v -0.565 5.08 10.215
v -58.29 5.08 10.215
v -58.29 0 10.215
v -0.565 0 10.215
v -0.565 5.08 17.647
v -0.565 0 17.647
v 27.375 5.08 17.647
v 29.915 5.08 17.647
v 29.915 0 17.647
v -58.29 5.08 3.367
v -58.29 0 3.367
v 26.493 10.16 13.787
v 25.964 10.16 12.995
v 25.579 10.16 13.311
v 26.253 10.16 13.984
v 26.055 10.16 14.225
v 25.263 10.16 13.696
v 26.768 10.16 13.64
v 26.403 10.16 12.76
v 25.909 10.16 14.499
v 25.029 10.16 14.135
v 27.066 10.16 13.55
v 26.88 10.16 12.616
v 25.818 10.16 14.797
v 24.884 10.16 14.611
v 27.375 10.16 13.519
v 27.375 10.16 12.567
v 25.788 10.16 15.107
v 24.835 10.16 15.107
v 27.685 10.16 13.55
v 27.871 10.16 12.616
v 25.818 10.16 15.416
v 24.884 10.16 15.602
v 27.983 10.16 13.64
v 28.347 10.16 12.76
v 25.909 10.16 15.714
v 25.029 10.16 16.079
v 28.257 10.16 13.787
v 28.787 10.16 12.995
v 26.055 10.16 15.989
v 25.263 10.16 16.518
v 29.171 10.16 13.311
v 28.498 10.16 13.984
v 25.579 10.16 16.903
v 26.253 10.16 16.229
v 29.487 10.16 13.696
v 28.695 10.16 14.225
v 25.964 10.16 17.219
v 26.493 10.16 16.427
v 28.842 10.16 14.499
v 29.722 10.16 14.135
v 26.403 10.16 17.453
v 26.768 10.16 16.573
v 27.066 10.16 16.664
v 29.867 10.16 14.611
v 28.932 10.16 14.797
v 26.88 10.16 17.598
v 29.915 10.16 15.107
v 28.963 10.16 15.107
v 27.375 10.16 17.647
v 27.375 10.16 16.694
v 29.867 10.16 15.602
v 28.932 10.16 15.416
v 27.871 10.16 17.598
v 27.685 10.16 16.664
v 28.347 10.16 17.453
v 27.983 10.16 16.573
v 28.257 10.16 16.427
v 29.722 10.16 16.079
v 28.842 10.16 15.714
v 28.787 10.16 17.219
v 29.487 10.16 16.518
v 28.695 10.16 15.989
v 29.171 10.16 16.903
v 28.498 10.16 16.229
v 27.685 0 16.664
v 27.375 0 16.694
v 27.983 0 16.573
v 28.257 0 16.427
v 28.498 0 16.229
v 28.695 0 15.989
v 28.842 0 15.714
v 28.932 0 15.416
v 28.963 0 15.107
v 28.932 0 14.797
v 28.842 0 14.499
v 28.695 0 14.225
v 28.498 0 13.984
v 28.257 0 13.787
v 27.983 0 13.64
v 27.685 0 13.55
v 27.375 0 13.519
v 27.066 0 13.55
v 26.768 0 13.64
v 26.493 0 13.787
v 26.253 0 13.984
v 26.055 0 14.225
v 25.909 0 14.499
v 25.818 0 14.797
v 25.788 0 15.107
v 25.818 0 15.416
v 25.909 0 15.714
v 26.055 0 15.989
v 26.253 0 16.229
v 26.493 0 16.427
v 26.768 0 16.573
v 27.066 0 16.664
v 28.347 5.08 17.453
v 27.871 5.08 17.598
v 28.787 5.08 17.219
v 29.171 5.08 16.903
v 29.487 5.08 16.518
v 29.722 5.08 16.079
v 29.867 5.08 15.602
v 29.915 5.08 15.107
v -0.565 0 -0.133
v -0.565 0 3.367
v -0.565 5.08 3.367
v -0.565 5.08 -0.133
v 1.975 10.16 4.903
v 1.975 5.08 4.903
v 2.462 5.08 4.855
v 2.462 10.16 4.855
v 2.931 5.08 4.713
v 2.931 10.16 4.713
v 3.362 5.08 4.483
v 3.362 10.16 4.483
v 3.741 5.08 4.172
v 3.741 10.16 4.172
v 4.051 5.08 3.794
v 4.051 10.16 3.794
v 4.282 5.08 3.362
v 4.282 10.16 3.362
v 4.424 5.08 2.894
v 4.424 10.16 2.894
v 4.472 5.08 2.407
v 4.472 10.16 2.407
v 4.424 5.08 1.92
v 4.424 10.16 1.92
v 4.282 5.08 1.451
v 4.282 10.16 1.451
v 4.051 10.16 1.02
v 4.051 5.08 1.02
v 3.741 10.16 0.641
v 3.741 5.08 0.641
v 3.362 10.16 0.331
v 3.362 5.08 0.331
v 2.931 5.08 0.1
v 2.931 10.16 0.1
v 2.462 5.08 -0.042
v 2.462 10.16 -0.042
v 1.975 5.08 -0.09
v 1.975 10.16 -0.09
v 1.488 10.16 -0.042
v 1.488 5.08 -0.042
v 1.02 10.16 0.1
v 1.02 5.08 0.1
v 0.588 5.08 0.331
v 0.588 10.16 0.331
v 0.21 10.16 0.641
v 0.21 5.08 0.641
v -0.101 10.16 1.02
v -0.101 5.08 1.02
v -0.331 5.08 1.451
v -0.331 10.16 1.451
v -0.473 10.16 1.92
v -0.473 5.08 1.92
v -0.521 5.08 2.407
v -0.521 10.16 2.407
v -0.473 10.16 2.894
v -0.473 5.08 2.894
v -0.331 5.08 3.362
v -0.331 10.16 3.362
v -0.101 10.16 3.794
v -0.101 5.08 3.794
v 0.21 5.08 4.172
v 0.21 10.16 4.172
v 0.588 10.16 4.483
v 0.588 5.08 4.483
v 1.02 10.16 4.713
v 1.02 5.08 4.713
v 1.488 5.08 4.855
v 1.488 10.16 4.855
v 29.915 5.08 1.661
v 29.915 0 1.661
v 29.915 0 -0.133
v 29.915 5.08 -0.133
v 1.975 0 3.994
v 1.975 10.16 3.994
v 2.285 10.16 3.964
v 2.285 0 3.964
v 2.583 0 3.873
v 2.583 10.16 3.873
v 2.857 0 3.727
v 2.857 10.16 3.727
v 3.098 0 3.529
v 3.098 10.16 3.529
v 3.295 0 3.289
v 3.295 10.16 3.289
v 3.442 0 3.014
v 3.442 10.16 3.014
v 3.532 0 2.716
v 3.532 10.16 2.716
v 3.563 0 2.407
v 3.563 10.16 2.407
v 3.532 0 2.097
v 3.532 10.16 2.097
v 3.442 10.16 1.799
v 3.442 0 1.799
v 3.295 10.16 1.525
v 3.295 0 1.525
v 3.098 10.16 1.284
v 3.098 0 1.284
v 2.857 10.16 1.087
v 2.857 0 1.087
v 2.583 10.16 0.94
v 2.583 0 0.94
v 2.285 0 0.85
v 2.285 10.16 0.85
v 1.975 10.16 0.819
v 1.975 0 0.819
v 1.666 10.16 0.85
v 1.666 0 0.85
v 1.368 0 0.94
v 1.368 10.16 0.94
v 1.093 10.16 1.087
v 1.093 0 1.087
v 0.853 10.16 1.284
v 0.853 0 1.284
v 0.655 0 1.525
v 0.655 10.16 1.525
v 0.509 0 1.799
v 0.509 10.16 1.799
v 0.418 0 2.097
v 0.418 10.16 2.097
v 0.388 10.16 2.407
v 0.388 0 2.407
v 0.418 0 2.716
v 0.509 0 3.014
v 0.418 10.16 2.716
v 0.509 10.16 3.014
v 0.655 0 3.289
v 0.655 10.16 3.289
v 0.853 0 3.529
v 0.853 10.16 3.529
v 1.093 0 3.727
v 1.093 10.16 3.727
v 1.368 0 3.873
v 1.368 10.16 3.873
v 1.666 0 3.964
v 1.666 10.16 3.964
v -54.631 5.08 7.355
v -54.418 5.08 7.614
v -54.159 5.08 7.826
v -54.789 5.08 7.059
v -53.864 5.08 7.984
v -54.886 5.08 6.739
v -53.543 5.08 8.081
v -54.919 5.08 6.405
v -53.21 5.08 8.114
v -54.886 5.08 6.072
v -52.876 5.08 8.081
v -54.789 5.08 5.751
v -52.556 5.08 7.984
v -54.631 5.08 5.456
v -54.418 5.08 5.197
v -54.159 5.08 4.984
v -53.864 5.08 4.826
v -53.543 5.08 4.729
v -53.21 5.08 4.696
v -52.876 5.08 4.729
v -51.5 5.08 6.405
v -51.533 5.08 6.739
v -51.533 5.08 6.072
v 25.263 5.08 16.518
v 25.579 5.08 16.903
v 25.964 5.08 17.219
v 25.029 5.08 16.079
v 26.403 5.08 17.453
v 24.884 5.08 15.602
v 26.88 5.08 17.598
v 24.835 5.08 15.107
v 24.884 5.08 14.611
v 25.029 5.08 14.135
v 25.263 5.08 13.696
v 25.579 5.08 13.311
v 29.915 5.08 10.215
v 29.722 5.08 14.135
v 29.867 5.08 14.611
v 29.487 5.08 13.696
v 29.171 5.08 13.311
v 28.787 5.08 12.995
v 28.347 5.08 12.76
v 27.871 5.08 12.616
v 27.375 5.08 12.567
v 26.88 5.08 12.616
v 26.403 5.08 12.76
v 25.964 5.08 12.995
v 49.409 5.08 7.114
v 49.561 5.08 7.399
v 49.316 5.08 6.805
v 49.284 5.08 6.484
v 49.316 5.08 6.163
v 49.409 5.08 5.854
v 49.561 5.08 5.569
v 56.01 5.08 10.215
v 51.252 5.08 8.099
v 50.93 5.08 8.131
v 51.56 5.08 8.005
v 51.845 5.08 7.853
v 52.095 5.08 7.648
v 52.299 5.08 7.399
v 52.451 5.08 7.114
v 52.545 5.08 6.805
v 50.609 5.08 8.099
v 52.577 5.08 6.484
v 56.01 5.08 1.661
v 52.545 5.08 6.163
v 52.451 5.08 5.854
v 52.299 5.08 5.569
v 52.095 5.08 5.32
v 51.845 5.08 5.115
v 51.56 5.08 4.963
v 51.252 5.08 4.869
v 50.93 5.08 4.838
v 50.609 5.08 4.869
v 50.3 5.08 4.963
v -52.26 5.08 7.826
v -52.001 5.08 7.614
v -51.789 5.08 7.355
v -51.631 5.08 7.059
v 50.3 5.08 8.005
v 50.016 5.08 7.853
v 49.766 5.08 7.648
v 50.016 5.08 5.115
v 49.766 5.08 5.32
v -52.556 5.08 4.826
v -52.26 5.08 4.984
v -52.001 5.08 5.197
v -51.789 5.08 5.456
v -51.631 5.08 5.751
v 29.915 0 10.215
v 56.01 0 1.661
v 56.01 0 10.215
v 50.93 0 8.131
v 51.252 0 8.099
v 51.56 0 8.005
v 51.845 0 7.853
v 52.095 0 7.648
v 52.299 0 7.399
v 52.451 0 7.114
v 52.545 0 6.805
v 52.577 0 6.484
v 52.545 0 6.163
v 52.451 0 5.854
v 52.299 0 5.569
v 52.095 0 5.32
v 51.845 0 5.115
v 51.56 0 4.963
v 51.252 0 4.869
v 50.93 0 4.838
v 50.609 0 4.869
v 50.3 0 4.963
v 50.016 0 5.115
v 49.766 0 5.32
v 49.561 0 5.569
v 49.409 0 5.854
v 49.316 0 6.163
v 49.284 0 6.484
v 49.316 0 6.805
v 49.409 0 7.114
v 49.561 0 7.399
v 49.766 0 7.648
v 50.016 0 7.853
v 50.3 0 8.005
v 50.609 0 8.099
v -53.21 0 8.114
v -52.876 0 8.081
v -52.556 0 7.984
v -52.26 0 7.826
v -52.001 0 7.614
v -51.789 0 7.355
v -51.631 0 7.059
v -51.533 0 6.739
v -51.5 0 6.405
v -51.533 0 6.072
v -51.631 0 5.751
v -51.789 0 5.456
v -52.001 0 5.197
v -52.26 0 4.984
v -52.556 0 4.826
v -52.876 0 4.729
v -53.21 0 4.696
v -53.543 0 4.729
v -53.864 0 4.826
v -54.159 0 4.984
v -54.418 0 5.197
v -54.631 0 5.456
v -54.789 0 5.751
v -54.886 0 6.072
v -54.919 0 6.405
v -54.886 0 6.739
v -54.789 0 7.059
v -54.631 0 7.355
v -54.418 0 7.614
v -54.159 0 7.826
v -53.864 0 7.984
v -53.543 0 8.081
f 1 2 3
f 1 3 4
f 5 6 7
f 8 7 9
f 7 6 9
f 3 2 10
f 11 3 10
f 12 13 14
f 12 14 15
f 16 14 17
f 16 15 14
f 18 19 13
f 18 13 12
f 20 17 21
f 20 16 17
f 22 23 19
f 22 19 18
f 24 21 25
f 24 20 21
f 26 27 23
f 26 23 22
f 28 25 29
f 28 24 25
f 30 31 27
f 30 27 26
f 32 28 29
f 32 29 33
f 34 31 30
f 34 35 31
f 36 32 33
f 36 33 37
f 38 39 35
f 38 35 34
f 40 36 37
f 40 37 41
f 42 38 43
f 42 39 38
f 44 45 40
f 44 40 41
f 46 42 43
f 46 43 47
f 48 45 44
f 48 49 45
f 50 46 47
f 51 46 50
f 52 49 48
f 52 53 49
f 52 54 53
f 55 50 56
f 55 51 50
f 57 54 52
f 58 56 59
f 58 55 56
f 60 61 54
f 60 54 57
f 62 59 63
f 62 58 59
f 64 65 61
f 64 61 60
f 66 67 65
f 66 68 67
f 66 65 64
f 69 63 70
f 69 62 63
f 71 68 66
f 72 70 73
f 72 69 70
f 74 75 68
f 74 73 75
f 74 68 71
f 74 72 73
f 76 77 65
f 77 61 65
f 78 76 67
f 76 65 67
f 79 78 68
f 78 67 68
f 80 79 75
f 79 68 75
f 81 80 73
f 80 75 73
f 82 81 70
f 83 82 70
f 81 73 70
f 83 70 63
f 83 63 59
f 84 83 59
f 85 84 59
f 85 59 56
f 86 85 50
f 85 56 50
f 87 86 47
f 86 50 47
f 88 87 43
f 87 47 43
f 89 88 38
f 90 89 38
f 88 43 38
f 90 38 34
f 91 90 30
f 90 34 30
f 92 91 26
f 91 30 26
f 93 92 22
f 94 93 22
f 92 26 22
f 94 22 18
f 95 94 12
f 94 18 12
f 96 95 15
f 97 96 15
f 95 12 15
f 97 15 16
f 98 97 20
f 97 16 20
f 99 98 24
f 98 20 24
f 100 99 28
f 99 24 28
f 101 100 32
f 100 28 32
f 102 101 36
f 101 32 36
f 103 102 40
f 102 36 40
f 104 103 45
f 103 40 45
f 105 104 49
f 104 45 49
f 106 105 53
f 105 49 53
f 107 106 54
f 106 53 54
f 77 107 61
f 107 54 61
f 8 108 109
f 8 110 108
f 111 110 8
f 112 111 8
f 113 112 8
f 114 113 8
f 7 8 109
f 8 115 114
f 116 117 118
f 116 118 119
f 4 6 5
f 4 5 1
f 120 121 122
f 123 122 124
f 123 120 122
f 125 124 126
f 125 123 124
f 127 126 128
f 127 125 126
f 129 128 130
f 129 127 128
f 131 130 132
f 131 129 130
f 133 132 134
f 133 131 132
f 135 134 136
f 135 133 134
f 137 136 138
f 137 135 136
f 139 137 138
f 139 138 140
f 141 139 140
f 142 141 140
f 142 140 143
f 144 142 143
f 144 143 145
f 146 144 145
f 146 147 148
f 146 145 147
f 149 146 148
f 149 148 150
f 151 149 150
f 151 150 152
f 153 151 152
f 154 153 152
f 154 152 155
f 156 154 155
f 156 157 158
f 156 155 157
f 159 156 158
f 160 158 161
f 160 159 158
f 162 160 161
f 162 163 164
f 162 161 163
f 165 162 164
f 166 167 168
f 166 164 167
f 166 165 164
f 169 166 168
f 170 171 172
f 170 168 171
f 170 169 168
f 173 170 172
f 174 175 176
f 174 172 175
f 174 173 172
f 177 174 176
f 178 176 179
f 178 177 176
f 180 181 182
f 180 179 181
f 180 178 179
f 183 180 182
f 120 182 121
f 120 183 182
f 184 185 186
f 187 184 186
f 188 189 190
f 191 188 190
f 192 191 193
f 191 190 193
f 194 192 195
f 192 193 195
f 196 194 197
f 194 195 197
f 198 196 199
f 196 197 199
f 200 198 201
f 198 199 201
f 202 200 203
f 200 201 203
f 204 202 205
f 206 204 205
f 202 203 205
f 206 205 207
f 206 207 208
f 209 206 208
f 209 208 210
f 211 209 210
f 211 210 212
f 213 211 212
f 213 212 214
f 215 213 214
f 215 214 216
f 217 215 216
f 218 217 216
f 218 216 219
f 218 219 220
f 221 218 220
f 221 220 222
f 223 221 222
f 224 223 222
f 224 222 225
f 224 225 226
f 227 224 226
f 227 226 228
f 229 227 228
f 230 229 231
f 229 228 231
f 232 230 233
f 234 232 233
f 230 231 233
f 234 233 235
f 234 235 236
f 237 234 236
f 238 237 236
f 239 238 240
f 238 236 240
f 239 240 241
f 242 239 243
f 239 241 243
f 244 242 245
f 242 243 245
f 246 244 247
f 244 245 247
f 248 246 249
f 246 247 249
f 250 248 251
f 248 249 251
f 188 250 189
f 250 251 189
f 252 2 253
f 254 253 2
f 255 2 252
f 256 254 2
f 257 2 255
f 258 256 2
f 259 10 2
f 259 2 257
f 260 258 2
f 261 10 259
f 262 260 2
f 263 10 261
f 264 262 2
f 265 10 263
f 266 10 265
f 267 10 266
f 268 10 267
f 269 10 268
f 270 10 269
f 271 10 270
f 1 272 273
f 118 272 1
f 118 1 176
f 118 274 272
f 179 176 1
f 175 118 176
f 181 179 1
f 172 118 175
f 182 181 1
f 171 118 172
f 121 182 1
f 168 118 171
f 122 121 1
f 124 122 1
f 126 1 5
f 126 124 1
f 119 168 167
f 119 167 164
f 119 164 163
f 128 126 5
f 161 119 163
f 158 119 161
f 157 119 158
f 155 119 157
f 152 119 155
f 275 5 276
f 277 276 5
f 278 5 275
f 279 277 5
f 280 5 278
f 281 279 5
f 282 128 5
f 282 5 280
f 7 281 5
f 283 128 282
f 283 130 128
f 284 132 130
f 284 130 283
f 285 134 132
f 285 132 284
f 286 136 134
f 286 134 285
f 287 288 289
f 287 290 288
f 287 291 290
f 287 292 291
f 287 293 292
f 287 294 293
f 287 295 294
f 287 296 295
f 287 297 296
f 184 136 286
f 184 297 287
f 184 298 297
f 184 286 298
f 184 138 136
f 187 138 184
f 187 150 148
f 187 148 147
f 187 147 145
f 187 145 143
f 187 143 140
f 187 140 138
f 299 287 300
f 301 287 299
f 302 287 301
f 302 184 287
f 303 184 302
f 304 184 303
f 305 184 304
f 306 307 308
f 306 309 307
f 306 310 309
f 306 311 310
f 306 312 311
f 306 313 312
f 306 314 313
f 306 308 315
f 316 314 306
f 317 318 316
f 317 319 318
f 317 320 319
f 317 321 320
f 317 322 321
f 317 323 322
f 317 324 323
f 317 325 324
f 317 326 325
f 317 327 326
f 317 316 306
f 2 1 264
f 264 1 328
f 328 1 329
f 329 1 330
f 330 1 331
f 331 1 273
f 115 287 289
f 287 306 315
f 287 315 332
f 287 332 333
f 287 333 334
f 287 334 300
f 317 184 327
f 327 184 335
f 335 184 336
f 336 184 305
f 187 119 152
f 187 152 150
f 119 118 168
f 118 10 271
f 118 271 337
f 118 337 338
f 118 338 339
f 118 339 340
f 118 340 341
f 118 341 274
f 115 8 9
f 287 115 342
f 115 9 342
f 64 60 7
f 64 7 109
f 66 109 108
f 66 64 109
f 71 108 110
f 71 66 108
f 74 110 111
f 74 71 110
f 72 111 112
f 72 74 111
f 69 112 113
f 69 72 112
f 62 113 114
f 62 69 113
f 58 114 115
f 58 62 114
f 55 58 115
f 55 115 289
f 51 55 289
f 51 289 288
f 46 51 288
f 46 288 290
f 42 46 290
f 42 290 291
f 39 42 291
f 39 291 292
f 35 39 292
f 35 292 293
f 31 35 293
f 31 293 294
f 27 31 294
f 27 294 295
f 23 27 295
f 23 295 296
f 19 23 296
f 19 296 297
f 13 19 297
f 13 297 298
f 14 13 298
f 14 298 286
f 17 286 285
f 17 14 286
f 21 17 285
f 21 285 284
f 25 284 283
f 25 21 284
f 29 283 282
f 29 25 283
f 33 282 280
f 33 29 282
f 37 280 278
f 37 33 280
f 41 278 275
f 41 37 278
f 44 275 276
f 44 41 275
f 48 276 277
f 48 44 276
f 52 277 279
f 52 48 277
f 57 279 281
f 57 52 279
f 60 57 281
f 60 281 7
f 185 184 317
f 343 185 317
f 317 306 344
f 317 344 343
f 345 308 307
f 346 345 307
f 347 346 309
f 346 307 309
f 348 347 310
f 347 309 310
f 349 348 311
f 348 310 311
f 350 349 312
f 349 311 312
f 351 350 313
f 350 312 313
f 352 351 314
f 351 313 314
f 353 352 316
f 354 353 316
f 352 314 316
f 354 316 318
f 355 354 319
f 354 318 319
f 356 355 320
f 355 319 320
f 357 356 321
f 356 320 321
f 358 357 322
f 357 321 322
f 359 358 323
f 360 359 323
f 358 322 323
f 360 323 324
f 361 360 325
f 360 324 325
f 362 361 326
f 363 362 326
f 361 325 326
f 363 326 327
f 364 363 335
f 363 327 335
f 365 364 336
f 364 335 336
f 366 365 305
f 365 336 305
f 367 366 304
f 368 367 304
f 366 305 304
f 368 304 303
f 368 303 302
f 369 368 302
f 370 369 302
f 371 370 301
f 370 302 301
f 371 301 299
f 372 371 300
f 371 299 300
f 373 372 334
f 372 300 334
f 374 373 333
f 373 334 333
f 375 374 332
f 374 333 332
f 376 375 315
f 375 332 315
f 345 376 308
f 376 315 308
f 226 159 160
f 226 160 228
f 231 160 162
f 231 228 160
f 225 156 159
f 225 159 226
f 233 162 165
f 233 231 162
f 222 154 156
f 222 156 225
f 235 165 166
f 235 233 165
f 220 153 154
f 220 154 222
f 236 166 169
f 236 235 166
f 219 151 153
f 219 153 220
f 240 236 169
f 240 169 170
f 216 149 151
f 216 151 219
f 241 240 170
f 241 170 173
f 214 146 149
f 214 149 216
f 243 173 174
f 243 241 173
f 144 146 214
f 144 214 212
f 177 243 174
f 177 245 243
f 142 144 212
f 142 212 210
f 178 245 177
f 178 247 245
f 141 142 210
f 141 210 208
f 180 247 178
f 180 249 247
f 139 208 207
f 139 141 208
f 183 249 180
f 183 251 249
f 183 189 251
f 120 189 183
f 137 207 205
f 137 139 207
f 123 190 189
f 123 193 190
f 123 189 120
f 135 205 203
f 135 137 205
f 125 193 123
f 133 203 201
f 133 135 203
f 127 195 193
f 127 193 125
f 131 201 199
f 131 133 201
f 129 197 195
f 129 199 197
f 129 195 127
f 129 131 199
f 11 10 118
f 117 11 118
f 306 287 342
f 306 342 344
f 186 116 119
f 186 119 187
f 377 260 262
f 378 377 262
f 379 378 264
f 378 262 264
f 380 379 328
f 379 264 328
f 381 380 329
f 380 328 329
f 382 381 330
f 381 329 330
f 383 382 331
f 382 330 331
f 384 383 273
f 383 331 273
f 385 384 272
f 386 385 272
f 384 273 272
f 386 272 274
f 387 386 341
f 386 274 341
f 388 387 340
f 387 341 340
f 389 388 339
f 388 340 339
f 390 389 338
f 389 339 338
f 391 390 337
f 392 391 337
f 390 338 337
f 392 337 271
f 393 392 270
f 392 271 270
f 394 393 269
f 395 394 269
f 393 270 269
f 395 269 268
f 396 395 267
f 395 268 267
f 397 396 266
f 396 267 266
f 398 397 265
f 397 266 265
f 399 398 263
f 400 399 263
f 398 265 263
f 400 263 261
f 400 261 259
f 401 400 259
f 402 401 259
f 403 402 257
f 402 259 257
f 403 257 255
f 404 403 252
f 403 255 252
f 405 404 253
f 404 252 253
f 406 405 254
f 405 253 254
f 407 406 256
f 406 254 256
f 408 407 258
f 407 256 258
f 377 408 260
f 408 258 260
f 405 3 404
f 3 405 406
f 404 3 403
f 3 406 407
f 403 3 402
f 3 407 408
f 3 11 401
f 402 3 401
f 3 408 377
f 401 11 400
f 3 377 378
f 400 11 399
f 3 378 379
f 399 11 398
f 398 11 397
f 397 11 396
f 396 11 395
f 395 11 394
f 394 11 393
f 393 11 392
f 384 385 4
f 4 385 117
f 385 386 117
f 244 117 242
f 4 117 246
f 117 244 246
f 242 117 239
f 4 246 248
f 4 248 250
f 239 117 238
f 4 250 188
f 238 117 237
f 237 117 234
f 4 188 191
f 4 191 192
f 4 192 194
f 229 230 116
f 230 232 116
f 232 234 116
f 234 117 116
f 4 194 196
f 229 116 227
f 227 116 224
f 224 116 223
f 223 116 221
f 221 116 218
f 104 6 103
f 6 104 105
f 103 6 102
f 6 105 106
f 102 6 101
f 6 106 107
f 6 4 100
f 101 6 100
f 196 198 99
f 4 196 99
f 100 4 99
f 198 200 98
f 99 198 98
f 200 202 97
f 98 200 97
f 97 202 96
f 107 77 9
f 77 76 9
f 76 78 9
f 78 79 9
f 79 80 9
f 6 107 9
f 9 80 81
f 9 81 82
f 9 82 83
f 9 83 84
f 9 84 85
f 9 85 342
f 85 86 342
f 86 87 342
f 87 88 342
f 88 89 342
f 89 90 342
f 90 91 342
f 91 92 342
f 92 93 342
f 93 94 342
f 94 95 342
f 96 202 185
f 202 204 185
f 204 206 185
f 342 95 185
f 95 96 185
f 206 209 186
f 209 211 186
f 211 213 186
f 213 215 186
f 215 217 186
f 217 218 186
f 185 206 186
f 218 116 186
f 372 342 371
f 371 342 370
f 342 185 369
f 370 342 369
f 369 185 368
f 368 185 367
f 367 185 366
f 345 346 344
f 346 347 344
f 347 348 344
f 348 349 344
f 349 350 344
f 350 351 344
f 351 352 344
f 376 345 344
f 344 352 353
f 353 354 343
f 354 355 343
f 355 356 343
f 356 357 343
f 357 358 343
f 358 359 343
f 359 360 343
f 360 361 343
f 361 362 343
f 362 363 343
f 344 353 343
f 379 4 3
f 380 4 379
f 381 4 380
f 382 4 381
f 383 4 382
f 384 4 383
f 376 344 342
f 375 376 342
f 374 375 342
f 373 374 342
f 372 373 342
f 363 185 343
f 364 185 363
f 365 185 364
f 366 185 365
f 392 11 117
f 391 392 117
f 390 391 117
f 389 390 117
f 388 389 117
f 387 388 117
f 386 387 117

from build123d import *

# Parameters (mm, degrees)
SKETCH1_W           = 30.48
SKETCH1_H           = 17.78
BOSS_EXTRUDE1_DEPTH = 5.08
SKETCH3_R           = 1.5875
CUT_EXTRUDE1_DEPTH  = 36.101886702
BOSS_EXTRUDE2_START = 5.08
SKETCH4_R           = 2.496623085
SKETCH4_R_2         = 1.5875
SKETCH4_R_3         = 2.54
BOSS_EXTRUDE2_DEPTH = 5.08
SKETCH6_W           = 26.095055506
SKETCH6_H           = 8.553777079
SKETCH6_R           = 1.646398399
BOSS_EXTRUDE3_DEPTH = 5.08
SKETCH7_W           = 57.960584247
SKETCH7_H           = 6.84758287
SKETCH7_R           = 1.709119501
BOSS_EXTRUDE4_DEPTH = 5.08


with BuildPart() as part:
    # Sketch1 → Boss-Extrude1 (new body)
    with BuildSketch(Plane(origin=(0, 0, 0), x_dir=(1, 0, 0), z_dir=(0, 1, 0))):
        with Locations((14.675357499, -8.756740088)):
            Rectangle(SKETCH1_W, SKETCH1_H)
    extrude(amount=BOSS_EXTRUDE1_DEPTH)

    # Sketch3 → Cut-Extrude1 (cut, through all)
    with BuildSketch(Plane(origin=(0, 5.08, 0), x_dir=(1, 0, 0), z_dir=(0, 1, 0))):
        with Locations(Location((1.975357499, -2.406740088, 0), (0, 0, 270))):
            Circle(SKETCH3_R)
        with Locations(Location((27.375357499, -15.106740088, 0), (0, 0, 270))):
            Circle(SKETCH3_R)
    extrude(amount=-CUT_EXTRUDE1_DEPTH, mode=Mode.SUBTRACT)

    # Sketch4 → Boss-Extrude2 (add)
    # profile 1 of 2: a face of its own
    with BuildSketch(Plane(origin=(0, 5.08, 0), x_dir=(1, 0, 0), z_dir=(0, 1, 0)).offset(BOSS_EXTRUDE2_START)):
        with Locations(Location((1.975357499, -2.406740088, 0), (0, 0, 270))):
            Circle(SKETCH4_R)
        with Locations(Location((1.975357499, -2.406740088, 0), (0, 0, 270))):
            Circle(SKETCH4_R_2, mode=Mode.SUBTRACT)
    # profile 2 of 2: a face of its own
    with BuildSketch(Plane(origin=(0, 5.08, 0), x_dir=(1, 0, 0), z_dir=(0, 1, 0)).offset(BOSS_EXTRUDE2_START)):
        with Locations(Location((27.375357499, -15.106740088, 0), (0, 0, 270))):
            Circle(SKETCH4_R_3)
        with Locations(Location((27.375357499, -15.106740088, 0), (0, 0, 270))):
            Circle(SKETCH4_R_2, mode=Mode.SUBTRACT)
    extrude(amount=-BOSS_EXTRUDE2_DEPTH)

    # Sketch6 → Boss-Extrude3 (add)
    with BuildSketch(Plane(origin=(0, 5.08, 0), x_dir=(1, 0, 0), z_dir=(0, 1, 0))):
        with Locations((42.962885252, -5.938189685)):
            Rectangle(SKETCH6_W, SKETCH6_H)
        with Locations(Location((50.930413005, -6.484145564, 0), (0, 0, 270))):
            Circle(SKETCH6_R, mode=Mode.SUBTRACT)
    extrude(amount=-BOSS_EXTRUDE3_DEPTH)

    # Sketch7 → Boss-Extrude4 (add)
    with BuildSketch(Plane(origin=(0, 5.08, 0), x_dir=(1, 0, 0), z_dir=(0, 1, 0))):
        with Locations((-29.309294872, -6.791286789)):
            Rectangle(SKETCH7_W, SKETCH7_H)
        with Locations(Location((-53.209586995, -6.405078224, 0), (0, 0, 270))):
            Circle(SKETCH7_R, mode=Mode.SUBTRACT)
    extrude(amount=-BOSS_EXTRUDE4_DEPTH)


solid = part.part
